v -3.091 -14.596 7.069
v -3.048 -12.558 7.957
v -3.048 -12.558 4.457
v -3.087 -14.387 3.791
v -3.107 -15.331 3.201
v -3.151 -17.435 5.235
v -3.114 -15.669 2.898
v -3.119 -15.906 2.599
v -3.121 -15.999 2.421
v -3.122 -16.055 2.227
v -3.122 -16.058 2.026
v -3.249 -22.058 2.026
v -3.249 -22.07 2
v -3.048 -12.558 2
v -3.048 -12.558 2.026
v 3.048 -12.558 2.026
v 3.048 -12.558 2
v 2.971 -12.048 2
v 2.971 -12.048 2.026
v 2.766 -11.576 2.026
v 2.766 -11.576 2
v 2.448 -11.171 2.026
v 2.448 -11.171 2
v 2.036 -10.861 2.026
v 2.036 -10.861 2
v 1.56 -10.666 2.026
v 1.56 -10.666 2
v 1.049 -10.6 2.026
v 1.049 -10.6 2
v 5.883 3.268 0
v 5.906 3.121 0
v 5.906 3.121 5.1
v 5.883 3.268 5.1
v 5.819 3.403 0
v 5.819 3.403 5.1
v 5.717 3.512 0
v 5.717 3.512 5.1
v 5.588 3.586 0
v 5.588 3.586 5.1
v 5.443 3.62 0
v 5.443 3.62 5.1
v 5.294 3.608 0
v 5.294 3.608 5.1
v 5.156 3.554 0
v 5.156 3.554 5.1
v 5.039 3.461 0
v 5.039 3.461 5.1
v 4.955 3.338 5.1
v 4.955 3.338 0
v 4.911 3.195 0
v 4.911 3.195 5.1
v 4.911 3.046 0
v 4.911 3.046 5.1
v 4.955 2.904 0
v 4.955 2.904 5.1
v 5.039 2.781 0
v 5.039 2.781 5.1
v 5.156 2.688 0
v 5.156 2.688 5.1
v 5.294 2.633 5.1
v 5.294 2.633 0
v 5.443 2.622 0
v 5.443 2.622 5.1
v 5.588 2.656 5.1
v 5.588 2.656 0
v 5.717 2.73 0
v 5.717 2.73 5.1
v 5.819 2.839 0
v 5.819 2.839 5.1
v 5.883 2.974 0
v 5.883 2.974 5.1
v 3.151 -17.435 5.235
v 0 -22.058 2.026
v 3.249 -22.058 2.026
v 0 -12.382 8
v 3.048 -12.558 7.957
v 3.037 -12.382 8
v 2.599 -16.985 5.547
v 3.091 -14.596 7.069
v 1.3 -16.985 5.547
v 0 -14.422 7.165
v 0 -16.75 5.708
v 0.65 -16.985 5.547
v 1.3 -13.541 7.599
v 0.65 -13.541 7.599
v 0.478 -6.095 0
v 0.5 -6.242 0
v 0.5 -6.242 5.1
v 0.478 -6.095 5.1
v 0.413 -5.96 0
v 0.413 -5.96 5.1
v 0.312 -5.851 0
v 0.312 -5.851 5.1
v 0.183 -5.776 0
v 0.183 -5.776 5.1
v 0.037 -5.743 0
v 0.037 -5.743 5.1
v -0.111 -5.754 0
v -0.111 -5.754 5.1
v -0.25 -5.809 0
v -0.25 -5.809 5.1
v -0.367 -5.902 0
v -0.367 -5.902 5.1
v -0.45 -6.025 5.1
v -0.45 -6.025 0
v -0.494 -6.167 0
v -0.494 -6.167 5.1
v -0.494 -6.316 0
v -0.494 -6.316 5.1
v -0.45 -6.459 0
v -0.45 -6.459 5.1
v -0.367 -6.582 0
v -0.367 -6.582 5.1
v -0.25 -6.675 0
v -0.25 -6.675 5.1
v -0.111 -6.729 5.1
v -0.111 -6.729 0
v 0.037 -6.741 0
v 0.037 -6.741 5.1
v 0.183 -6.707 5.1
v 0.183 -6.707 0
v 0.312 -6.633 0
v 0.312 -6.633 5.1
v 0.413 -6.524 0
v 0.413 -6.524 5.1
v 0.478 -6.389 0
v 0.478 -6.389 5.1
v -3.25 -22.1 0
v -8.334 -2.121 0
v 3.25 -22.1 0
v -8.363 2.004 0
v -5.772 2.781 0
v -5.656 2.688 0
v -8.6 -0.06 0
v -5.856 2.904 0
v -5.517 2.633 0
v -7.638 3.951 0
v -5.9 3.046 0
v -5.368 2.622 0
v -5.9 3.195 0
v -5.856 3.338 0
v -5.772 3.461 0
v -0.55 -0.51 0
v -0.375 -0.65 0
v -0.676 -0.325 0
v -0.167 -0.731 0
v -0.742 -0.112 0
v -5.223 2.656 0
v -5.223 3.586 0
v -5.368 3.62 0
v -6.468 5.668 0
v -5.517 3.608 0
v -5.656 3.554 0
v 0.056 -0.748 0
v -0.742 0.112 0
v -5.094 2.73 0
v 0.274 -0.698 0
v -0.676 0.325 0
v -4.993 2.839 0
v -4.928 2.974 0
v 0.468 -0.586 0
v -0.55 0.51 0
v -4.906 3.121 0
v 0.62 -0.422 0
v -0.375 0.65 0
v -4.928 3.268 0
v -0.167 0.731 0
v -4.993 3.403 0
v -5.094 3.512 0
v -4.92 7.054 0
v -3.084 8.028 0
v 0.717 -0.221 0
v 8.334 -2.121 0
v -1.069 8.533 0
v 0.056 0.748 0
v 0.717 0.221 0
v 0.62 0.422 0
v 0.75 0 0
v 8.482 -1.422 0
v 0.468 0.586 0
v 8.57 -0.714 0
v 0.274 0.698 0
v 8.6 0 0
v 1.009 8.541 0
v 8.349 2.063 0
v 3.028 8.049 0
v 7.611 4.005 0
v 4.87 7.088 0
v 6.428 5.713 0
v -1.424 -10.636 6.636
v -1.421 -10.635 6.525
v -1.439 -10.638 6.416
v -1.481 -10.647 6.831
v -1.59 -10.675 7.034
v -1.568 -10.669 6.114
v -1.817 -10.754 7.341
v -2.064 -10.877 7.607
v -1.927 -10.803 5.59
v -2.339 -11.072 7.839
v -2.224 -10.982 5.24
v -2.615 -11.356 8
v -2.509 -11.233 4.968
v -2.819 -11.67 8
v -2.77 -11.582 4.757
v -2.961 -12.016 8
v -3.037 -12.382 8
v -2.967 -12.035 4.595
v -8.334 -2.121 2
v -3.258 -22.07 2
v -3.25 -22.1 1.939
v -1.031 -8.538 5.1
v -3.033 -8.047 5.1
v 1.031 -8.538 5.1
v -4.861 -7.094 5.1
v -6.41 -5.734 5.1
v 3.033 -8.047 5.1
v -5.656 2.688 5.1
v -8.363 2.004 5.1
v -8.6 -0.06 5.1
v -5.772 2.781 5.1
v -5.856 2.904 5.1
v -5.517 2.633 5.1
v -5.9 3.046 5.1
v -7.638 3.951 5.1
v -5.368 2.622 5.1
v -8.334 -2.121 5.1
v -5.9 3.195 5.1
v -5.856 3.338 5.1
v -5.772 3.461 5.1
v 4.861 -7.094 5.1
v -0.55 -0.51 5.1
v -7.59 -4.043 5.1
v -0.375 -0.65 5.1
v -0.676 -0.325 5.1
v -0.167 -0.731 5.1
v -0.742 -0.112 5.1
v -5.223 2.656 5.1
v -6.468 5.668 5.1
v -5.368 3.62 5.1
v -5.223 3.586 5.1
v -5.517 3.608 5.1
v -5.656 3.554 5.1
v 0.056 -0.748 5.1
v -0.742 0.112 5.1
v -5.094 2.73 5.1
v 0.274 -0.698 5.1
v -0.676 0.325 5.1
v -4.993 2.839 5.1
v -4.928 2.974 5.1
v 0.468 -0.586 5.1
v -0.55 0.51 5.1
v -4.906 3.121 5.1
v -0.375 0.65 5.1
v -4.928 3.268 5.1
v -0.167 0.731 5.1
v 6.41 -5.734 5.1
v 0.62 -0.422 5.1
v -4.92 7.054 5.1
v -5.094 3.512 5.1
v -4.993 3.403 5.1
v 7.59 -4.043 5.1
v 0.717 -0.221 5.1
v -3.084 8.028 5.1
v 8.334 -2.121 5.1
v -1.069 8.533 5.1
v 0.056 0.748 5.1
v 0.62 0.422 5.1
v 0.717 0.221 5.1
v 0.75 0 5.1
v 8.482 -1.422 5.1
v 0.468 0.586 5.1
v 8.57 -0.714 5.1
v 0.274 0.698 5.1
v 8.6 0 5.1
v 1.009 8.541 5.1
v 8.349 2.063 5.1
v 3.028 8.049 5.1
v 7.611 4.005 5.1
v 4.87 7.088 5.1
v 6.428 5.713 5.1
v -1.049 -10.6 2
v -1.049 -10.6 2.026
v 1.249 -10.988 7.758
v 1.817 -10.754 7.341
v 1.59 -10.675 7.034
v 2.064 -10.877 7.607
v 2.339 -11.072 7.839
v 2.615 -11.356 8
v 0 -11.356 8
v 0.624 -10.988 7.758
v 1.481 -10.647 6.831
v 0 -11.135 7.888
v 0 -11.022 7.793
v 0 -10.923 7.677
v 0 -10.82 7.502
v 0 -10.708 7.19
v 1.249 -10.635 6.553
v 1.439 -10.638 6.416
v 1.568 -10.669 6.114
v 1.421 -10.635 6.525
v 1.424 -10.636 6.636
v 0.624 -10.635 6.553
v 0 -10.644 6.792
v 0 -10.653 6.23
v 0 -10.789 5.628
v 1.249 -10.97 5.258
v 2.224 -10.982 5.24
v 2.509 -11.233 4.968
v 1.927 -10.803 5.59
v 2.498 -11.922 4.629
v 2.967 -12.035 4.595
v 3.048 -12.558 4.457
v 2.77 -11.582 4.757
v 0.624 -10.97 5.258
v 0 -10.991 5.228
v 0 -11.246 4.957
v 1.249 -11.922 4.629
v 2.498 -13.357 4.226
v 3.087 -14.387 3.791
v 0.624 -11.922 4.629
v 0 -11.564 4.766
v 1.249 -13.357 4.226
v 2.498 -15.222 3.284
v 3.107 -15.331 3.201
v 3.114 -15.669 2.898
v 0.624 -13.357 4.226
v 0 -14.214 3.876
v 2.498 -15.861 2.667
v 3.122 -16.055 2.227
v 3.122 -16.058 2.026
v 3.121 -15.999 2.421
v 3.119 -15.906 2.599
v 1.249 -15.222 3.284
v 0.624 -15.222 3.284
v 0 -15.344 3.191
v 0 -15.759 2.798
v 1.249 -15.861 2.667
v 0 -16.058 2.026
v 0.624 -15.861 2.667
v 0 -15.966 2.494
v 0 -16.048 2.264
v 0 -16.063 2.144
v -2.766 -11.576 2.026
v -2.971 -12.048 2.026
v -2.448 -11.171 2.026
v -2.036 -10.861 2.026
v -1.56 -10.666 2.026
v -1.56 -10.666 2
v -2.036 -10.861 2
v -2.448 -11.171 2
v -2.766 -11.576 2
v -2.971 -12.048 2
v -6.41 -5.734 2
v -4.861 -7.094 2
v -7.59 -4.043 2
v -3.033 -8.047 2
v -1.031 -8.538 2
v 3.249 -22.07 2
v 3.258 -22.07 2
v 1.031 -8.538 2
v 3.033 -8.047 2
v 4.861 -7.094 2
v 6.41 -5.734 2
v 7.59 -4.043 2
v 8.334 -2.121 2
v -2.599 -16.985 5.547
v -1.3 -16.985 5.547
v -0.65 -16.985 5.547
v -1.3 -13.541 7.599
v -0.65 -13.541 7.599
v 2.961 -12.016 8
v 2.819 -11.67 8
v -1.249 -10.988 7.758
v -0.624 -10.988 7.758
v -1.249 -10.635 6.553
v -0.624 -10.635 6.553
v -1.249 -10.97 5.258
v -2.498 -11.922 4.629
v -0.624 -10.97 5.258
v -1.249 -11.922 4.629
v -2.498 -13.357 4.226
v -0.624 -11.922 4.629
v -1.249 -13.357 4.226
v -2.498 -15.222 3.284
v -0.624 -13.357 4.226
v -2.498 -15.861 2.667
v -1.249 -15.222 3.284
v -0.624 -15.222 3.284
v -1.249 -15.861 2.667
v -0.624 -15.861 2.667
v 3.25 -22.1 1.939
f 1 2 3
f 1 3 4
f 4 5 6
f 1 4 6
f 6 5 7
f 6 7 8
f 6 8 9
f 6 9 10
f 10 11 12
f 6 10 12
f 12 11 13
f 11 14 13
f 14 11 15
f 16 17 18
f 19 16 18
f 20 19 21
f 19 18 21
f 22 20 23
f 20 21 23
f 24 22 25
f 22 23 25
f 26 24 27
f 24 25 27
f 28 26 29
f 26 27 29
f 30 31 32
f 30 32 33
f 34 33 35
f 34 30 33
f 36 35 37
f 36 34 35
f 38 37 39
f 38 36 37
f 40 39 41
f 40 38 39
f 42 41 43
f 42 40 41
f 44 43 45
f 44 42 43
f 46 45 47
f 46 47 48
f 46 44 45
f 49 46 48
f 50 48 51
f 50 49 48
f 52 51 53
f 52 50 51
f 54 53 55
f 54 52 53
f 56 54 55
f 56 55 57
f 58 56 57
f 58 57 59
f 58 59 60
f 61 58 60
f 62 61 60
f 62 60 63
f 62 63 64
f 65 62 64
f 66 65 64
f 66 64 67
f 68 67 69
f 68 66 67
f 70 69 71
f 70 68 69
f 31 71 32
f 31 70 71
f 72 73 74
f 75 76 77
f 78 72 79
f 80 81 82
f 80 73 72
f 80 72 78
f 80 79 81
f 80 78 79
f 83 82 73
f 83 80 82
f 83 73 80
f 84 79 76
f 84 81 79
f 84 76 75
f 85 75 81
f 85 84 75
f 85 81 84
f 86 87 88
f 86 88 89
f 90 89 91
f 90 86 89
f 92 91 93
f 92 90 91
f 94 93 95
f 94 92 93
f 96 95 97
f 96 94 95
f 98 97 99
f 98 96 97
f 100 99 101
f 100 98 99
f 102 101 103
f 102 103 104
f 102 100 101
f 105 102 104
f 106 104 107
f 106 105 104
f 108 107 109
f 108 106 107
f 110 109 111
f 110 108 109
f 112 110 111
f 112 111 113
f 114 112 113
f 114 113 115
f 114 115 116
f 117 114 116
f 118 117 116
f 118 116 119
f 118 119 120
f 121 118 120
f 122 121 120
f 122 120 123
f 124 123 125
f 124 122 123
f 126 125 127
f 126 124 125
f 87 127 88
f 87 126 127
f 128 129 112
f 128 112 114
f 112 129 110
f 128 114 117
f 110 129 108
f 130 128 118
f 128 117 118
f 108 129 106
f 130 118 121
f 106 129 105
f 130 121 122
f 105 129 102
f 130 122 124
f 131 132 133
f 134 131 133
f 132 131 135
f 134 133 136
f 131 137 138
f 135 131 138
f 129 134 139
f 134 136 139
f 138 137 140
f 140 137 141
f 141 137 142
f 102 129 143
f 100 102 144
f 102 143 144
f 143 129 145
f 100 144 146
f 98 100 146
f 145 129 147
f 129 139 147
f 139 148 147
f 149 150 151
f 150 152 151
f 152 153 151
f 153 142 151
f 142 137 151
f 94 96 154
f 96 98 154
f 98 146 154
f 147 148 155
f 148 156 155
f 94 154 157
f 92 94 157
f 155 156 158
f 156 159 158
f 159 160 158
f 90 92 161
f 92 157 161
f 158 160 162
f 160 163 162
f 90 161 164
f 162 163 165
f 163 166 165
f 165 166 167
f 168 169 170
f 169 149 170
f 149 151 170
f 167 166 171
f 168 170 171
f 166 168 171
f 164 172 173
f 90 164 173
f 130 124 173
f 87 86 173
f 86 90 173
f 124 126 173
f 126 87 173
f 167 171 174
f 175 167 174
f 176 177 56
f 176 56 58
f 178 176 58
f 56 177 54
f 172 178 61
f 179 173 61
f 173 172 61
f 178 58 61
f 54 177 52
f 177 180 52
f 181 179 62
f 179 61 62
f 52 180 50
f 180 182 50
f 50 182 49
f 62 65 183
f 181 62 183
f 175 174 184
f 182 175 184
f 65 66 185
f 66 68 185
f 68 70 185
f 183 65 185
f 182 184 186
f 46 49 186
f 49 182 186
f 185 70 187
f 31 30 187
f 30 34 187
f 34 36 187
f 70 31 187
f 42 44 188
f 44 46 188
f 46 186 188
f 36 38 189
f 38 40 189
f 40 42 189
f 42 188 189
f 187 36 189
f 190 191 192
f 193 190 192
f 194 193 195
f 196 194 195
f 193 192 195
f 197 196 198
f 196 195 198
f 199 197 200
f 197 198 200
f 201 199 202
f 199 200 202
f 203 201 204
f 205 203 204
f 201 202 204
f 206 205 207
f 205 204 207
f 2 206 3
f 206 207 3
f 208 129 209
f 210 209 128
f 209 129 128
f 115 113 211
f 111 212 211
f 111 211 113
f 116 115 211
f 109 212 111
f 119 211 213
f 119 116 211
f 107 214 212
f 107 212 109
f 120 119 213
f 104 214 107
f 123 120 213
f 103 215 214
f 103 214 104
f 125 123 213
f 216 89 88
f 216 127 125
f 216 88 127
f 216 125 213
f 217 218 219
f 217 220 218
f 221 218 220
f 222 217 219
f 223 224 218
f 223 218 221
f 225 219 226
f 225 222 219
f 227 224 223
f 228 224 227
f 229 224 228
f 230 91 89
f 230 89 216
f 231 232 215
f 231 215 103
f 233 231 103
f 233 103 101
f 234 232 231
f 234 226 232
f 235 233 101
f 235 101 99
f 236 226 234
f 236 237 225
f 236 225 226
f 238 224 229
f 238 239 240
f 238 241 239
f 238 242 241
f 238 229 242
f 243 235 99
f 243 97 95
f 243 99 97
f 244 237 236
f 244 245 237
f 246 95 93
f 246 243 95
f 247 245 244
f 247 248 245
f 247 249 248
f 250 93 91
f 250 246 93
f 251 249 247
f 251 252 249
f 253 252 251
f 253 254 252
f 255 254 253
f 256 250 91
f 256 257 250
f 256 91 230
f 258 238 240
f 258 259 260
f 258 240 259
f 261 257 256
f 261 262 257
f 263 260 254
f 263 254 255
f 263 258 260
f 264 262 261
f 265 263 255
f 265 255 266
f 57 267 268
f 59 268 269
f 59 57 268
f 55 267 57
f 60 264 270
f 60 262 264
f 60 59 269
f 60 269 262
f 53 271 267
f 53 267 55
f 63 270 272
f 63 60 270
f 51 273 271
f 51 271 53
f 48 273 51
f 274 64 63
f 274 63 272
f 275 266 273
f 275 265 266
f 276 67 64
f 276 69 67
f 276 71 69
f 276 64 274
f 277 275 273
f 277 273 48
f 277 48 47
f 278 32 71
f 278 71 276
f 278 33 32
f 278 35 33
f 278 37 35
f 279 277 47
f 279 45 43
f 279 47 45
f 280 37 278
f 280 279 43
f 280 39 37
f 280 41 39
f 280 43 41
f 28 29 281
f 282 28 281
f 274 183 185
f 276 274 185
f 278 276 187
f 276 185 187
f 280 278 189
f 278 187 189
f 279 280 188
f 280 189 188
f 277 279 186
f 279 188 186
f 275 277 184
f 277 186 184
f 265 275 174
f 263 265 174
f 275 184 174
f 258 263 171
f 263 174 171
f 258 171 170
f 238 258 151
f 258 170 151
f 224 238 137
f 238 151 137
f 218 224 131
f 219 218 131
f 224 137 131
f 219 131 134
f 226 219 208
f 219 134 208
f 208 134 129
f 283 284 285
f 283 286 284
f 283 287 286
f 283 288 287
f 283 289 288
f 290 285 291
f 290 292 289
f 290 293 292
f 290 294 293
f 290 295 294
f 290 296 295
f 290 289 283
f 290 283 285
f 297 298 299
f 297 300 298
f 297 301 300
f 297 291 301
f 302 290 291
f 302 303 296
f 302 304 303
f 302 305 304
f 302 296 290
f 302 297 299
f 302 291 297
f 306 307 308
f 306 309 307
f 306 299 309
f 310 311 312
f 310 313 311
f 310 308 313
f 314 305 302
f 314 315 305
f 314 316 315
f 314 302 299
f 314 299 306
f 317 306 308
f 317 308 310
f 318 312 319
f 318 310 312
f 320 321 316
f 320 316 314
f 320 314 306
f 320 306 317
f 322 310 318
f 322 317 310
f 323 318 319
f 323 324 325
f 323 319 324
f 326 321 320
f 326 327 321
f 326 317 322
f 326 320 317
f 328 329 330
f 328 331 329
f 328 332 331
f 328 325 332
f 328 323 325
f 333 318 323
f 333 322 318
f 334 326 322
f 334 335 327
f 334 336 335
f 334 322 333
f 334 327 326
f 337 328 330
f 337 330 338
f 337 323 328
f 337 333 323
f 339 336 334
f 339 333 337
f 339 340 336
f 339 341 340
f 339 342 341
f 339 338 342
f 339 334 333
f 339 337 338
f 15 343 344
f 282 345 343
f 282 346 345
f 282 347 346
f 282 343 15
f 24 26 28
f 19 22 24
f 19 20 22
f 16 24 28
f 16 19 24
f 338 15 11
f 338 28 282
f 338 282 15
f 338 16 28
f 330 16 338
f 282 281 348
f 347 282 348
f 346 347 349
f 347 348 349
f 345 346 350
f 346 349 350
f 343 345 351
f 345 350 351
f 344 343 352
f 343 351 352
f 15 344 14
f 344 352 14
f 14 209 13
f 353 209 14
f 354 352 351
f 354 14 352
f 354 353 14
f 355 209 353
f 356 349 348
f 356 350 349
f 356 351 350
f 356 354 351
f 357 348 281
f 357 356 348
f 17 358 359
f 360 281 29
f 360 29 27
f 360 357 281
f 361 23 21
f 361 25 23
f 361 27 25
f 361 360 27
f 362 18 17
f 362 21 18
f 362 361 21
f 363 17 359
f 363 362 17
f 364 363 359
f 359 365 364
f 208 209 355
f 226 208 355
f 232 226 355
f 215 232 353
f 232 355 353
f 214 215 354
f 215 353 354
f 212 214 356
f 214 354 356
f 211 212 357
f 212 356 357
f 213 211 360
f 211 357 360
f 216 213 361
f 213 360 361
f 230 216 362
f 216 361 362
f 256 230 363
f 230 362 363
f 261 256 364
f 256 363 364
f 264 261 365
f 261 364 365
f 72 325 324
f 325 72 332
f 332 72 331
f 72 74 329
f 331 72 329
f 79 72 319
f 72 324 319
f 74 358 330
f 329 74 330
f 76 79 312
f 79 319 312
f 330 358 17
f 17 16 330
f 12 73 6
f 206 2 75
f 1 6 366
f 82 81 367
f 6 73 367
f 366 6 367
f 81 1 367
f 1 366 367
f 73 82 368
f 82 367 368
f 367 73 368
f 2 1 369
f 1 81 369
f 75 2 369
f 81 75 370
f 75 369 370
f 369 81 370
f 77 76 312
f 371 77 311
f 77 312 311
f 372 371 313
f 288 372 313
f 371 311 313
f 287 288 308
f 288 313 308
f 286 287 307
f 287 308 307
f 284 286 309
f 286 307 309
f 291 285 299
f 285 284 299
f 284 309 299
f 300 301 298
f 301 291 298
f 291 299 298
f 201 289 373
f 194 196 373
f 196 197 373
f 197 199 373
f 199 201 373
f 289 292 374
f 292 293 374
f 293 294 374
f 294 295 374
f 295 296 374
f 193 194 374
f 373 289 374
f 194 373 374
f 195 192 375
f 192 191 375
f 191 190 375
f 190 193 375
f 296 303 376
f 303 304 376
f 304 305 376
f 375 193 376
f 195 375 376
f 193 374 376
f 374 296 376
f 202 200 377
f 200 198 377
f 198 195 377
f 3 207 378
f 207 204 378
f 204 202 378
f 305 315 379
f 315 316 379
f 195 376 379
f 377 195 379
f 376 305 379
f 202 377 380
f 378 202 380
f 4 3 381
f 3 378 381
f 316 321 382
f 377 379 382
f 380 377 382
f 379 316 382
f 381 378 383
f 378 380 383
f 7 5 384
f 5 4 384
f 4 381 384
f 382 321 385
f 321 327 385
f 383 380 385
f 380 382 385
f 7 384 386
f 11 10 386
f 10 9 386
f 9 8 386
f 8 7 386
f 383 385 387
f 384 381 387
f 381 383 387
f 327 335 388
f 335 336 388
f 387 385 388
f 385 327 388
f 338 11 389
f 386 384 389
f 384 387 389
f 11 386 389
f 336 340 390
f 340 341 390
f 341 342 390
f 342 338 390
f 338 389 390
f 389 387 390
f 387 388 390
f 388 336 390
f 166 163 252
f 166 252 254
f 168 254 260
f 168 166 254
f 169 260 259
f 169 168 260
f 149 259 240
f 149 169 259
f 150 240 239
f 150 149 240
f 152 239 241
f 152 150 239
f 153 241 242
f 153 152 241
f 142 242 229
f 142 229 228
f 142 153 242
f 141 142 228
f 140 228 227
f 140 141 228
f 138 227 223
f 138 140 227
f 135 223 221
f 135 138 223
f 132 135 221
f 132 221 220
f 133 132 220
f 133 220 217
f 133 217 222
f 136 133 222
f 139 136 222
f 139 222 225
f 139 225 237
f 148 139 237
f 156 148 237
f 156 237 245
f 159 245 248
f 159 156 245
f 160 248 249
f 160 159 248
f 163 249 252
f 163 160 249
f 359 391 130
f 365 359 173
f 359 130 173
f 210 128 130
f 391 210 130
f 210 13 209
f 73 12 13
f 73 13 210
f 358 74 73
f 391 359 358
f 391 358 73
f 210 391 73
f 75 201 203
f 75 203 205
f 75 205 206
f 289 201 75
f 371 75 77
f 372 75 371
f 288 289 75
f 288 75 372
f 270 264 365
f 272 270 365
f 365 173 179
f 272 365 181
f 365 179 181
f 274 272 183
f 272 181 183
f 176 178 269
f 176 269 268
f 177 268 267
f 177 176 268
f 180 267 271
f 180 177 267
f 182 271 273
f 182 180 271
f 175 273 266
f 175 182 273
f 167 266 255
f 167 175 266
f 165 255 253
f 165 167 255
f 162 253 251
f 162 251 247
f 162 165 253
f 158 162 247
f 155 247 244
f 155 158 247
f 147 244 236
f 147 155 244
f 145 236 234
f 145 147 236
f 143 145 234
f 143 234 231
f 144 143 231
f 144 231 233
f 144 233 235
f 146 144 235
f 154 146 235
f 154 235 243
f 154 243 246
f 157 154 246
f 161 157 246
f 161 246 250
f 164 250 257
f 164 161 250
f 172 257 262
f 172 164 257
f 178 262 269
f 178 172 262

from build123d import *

# Parameters (mm, degrees)
F0_R     = 0.5
F0_R_2   = 0.75
F1_DEPTH = 5.1
F2_DEPTH = 2
F4_DEPTH = 6
F6_DEPTH = 12.5


with BuildPart() as f1:
    # F0 (on Top) → F1 (new body)
    with BuildSketch(Plane.XY):
        with BuildLine():
            ThreePointArc((8.3343568954, -2.1209656149), (8.5333308063, -1.0687681459), (8.6, 0))
            ThreePointArc((8.6, 0), (-1.0687681459, 8.5333308063), (-8.3343568954, -2.1209656149))
            ThreePointArc((-8.3343568954, -2.1209656149), (0, -8.6), (8.3343568954, -2.1209656149))
        make_face()
        with Locations((-5.405664058, 3.1209615991)):
            Circle(F0_R, mode=Mode.SUBTRACT)
        with Locations((0, -6.2419231981)):
            Circle(F0_R, mode=Mode.SUBTRACT)
        Circle(F0_R_2, mode=Mode.SUBTRACT)
        with Locations((5.405664058, 3.1209615991)):
            Circle(F0_R, mode=Mode.SUBTRACT)
    extrude(amount=F1_DEPTH)

    # F0 (on Top) → F2 (join)
    with BuildSketch(Plane.XY):
        with BuildLine():
            ThreePointArc((8.3343568954, -2.1209656149), (0, -8.6), (-8.3343568954, -2.1209656149))
            Line((-8.3343568954, -2.1209656149), (-3.25, -22.1))
            Line((-3.25, -22.1), (3.25, -22.1))
            Line((3.25, -22.1), (8.3343568954, -2.1209656149))
        make_face()
    extrude(amount=F2_DEPTH)

    # F3 (on face) → F4 (join)
    with BuildSketch(Plane.XY.offset(2)):
        with BuildLine():
            Line((-3.0482308868, -12.5577199533), (-3.25, -22.1))
            Line((-3.25, -22.1), (3.25, -22.1))
            Line((3.25, -22.1), (3.0482308868, -12.5577199533))
            ThreePointArc((3.0482308868, -12.5577199533), (2.447863298, -11.1709163612), (1.0486778373, -10.6))
            Line((1.0486778373, -10.6), (-1.0486778373, -10.6))
            ThreePointArc((-1.0486778373, -10.6), (-2.447863298, -11.1709163612), (-3.0482308868, -12.5577199533))
        make_face()
    extrude(amount=F4_DEPTH)

    # F5 (on Right) → F6 (intersect, symmetric)
    with BuildSketch(Plane.YZ):
        with BuildLine():
            add(Edge.make_bspline(
                [(-22.0577802784, 2.0259046448), (-17.8050547421, 4.9004560213), (-14.5293847897, 7.5751652736), (-10.4708936119, 8.5418524459), (-10.5693109534, 4.5828096798), (-13.2662088909, 4.6015626195), (-16.1733651308, 2.8726245308), (-16.0577802784, 2.0259046448)],
                knots=[0, 0, 0, 0, 0.3238992112, 0.4862577355, 0.646782374, 0.8105162215, 1, 1, 1, 1], degree=3))
            Line((-22.0577802784, 2.0259046448), (-23.0374708772, 0))
            Line((-23.0374708772, 0), (-19.6792803642, -1.6239597866))
            Line((-19.6792803642, -1.6239597866), (11.3044586033, -3.4222211689))
            Line((11.3044586033, -3.4222211689), (11.6330533383, 2.2394104473))
            Line((11.6330533383, 2.2394104473), (9.3493293971, 8.4649659693))
            Line((9.3493293971, 8.4649659693), (-3.0461885035, 7.9566333443))
            Line((-3.0461885035, 7.9566333443), (-9.4479173422, 6.1554415151))
            Line((-9.4479173422, 6.1554415151), (-9.5424316823, 4.2449091561))
            Line((-9.5424316823, 4.2449091561), (-10.334789753, 2.0259046448))
            Line((-10.334789753, 2.0259046448), (-16.0577802784, 2.0259046448))
        make_face()
    extrude(amount=F6_DEPTH, both=True, mode=Mode.INTERSECT)


solid = f1.part
